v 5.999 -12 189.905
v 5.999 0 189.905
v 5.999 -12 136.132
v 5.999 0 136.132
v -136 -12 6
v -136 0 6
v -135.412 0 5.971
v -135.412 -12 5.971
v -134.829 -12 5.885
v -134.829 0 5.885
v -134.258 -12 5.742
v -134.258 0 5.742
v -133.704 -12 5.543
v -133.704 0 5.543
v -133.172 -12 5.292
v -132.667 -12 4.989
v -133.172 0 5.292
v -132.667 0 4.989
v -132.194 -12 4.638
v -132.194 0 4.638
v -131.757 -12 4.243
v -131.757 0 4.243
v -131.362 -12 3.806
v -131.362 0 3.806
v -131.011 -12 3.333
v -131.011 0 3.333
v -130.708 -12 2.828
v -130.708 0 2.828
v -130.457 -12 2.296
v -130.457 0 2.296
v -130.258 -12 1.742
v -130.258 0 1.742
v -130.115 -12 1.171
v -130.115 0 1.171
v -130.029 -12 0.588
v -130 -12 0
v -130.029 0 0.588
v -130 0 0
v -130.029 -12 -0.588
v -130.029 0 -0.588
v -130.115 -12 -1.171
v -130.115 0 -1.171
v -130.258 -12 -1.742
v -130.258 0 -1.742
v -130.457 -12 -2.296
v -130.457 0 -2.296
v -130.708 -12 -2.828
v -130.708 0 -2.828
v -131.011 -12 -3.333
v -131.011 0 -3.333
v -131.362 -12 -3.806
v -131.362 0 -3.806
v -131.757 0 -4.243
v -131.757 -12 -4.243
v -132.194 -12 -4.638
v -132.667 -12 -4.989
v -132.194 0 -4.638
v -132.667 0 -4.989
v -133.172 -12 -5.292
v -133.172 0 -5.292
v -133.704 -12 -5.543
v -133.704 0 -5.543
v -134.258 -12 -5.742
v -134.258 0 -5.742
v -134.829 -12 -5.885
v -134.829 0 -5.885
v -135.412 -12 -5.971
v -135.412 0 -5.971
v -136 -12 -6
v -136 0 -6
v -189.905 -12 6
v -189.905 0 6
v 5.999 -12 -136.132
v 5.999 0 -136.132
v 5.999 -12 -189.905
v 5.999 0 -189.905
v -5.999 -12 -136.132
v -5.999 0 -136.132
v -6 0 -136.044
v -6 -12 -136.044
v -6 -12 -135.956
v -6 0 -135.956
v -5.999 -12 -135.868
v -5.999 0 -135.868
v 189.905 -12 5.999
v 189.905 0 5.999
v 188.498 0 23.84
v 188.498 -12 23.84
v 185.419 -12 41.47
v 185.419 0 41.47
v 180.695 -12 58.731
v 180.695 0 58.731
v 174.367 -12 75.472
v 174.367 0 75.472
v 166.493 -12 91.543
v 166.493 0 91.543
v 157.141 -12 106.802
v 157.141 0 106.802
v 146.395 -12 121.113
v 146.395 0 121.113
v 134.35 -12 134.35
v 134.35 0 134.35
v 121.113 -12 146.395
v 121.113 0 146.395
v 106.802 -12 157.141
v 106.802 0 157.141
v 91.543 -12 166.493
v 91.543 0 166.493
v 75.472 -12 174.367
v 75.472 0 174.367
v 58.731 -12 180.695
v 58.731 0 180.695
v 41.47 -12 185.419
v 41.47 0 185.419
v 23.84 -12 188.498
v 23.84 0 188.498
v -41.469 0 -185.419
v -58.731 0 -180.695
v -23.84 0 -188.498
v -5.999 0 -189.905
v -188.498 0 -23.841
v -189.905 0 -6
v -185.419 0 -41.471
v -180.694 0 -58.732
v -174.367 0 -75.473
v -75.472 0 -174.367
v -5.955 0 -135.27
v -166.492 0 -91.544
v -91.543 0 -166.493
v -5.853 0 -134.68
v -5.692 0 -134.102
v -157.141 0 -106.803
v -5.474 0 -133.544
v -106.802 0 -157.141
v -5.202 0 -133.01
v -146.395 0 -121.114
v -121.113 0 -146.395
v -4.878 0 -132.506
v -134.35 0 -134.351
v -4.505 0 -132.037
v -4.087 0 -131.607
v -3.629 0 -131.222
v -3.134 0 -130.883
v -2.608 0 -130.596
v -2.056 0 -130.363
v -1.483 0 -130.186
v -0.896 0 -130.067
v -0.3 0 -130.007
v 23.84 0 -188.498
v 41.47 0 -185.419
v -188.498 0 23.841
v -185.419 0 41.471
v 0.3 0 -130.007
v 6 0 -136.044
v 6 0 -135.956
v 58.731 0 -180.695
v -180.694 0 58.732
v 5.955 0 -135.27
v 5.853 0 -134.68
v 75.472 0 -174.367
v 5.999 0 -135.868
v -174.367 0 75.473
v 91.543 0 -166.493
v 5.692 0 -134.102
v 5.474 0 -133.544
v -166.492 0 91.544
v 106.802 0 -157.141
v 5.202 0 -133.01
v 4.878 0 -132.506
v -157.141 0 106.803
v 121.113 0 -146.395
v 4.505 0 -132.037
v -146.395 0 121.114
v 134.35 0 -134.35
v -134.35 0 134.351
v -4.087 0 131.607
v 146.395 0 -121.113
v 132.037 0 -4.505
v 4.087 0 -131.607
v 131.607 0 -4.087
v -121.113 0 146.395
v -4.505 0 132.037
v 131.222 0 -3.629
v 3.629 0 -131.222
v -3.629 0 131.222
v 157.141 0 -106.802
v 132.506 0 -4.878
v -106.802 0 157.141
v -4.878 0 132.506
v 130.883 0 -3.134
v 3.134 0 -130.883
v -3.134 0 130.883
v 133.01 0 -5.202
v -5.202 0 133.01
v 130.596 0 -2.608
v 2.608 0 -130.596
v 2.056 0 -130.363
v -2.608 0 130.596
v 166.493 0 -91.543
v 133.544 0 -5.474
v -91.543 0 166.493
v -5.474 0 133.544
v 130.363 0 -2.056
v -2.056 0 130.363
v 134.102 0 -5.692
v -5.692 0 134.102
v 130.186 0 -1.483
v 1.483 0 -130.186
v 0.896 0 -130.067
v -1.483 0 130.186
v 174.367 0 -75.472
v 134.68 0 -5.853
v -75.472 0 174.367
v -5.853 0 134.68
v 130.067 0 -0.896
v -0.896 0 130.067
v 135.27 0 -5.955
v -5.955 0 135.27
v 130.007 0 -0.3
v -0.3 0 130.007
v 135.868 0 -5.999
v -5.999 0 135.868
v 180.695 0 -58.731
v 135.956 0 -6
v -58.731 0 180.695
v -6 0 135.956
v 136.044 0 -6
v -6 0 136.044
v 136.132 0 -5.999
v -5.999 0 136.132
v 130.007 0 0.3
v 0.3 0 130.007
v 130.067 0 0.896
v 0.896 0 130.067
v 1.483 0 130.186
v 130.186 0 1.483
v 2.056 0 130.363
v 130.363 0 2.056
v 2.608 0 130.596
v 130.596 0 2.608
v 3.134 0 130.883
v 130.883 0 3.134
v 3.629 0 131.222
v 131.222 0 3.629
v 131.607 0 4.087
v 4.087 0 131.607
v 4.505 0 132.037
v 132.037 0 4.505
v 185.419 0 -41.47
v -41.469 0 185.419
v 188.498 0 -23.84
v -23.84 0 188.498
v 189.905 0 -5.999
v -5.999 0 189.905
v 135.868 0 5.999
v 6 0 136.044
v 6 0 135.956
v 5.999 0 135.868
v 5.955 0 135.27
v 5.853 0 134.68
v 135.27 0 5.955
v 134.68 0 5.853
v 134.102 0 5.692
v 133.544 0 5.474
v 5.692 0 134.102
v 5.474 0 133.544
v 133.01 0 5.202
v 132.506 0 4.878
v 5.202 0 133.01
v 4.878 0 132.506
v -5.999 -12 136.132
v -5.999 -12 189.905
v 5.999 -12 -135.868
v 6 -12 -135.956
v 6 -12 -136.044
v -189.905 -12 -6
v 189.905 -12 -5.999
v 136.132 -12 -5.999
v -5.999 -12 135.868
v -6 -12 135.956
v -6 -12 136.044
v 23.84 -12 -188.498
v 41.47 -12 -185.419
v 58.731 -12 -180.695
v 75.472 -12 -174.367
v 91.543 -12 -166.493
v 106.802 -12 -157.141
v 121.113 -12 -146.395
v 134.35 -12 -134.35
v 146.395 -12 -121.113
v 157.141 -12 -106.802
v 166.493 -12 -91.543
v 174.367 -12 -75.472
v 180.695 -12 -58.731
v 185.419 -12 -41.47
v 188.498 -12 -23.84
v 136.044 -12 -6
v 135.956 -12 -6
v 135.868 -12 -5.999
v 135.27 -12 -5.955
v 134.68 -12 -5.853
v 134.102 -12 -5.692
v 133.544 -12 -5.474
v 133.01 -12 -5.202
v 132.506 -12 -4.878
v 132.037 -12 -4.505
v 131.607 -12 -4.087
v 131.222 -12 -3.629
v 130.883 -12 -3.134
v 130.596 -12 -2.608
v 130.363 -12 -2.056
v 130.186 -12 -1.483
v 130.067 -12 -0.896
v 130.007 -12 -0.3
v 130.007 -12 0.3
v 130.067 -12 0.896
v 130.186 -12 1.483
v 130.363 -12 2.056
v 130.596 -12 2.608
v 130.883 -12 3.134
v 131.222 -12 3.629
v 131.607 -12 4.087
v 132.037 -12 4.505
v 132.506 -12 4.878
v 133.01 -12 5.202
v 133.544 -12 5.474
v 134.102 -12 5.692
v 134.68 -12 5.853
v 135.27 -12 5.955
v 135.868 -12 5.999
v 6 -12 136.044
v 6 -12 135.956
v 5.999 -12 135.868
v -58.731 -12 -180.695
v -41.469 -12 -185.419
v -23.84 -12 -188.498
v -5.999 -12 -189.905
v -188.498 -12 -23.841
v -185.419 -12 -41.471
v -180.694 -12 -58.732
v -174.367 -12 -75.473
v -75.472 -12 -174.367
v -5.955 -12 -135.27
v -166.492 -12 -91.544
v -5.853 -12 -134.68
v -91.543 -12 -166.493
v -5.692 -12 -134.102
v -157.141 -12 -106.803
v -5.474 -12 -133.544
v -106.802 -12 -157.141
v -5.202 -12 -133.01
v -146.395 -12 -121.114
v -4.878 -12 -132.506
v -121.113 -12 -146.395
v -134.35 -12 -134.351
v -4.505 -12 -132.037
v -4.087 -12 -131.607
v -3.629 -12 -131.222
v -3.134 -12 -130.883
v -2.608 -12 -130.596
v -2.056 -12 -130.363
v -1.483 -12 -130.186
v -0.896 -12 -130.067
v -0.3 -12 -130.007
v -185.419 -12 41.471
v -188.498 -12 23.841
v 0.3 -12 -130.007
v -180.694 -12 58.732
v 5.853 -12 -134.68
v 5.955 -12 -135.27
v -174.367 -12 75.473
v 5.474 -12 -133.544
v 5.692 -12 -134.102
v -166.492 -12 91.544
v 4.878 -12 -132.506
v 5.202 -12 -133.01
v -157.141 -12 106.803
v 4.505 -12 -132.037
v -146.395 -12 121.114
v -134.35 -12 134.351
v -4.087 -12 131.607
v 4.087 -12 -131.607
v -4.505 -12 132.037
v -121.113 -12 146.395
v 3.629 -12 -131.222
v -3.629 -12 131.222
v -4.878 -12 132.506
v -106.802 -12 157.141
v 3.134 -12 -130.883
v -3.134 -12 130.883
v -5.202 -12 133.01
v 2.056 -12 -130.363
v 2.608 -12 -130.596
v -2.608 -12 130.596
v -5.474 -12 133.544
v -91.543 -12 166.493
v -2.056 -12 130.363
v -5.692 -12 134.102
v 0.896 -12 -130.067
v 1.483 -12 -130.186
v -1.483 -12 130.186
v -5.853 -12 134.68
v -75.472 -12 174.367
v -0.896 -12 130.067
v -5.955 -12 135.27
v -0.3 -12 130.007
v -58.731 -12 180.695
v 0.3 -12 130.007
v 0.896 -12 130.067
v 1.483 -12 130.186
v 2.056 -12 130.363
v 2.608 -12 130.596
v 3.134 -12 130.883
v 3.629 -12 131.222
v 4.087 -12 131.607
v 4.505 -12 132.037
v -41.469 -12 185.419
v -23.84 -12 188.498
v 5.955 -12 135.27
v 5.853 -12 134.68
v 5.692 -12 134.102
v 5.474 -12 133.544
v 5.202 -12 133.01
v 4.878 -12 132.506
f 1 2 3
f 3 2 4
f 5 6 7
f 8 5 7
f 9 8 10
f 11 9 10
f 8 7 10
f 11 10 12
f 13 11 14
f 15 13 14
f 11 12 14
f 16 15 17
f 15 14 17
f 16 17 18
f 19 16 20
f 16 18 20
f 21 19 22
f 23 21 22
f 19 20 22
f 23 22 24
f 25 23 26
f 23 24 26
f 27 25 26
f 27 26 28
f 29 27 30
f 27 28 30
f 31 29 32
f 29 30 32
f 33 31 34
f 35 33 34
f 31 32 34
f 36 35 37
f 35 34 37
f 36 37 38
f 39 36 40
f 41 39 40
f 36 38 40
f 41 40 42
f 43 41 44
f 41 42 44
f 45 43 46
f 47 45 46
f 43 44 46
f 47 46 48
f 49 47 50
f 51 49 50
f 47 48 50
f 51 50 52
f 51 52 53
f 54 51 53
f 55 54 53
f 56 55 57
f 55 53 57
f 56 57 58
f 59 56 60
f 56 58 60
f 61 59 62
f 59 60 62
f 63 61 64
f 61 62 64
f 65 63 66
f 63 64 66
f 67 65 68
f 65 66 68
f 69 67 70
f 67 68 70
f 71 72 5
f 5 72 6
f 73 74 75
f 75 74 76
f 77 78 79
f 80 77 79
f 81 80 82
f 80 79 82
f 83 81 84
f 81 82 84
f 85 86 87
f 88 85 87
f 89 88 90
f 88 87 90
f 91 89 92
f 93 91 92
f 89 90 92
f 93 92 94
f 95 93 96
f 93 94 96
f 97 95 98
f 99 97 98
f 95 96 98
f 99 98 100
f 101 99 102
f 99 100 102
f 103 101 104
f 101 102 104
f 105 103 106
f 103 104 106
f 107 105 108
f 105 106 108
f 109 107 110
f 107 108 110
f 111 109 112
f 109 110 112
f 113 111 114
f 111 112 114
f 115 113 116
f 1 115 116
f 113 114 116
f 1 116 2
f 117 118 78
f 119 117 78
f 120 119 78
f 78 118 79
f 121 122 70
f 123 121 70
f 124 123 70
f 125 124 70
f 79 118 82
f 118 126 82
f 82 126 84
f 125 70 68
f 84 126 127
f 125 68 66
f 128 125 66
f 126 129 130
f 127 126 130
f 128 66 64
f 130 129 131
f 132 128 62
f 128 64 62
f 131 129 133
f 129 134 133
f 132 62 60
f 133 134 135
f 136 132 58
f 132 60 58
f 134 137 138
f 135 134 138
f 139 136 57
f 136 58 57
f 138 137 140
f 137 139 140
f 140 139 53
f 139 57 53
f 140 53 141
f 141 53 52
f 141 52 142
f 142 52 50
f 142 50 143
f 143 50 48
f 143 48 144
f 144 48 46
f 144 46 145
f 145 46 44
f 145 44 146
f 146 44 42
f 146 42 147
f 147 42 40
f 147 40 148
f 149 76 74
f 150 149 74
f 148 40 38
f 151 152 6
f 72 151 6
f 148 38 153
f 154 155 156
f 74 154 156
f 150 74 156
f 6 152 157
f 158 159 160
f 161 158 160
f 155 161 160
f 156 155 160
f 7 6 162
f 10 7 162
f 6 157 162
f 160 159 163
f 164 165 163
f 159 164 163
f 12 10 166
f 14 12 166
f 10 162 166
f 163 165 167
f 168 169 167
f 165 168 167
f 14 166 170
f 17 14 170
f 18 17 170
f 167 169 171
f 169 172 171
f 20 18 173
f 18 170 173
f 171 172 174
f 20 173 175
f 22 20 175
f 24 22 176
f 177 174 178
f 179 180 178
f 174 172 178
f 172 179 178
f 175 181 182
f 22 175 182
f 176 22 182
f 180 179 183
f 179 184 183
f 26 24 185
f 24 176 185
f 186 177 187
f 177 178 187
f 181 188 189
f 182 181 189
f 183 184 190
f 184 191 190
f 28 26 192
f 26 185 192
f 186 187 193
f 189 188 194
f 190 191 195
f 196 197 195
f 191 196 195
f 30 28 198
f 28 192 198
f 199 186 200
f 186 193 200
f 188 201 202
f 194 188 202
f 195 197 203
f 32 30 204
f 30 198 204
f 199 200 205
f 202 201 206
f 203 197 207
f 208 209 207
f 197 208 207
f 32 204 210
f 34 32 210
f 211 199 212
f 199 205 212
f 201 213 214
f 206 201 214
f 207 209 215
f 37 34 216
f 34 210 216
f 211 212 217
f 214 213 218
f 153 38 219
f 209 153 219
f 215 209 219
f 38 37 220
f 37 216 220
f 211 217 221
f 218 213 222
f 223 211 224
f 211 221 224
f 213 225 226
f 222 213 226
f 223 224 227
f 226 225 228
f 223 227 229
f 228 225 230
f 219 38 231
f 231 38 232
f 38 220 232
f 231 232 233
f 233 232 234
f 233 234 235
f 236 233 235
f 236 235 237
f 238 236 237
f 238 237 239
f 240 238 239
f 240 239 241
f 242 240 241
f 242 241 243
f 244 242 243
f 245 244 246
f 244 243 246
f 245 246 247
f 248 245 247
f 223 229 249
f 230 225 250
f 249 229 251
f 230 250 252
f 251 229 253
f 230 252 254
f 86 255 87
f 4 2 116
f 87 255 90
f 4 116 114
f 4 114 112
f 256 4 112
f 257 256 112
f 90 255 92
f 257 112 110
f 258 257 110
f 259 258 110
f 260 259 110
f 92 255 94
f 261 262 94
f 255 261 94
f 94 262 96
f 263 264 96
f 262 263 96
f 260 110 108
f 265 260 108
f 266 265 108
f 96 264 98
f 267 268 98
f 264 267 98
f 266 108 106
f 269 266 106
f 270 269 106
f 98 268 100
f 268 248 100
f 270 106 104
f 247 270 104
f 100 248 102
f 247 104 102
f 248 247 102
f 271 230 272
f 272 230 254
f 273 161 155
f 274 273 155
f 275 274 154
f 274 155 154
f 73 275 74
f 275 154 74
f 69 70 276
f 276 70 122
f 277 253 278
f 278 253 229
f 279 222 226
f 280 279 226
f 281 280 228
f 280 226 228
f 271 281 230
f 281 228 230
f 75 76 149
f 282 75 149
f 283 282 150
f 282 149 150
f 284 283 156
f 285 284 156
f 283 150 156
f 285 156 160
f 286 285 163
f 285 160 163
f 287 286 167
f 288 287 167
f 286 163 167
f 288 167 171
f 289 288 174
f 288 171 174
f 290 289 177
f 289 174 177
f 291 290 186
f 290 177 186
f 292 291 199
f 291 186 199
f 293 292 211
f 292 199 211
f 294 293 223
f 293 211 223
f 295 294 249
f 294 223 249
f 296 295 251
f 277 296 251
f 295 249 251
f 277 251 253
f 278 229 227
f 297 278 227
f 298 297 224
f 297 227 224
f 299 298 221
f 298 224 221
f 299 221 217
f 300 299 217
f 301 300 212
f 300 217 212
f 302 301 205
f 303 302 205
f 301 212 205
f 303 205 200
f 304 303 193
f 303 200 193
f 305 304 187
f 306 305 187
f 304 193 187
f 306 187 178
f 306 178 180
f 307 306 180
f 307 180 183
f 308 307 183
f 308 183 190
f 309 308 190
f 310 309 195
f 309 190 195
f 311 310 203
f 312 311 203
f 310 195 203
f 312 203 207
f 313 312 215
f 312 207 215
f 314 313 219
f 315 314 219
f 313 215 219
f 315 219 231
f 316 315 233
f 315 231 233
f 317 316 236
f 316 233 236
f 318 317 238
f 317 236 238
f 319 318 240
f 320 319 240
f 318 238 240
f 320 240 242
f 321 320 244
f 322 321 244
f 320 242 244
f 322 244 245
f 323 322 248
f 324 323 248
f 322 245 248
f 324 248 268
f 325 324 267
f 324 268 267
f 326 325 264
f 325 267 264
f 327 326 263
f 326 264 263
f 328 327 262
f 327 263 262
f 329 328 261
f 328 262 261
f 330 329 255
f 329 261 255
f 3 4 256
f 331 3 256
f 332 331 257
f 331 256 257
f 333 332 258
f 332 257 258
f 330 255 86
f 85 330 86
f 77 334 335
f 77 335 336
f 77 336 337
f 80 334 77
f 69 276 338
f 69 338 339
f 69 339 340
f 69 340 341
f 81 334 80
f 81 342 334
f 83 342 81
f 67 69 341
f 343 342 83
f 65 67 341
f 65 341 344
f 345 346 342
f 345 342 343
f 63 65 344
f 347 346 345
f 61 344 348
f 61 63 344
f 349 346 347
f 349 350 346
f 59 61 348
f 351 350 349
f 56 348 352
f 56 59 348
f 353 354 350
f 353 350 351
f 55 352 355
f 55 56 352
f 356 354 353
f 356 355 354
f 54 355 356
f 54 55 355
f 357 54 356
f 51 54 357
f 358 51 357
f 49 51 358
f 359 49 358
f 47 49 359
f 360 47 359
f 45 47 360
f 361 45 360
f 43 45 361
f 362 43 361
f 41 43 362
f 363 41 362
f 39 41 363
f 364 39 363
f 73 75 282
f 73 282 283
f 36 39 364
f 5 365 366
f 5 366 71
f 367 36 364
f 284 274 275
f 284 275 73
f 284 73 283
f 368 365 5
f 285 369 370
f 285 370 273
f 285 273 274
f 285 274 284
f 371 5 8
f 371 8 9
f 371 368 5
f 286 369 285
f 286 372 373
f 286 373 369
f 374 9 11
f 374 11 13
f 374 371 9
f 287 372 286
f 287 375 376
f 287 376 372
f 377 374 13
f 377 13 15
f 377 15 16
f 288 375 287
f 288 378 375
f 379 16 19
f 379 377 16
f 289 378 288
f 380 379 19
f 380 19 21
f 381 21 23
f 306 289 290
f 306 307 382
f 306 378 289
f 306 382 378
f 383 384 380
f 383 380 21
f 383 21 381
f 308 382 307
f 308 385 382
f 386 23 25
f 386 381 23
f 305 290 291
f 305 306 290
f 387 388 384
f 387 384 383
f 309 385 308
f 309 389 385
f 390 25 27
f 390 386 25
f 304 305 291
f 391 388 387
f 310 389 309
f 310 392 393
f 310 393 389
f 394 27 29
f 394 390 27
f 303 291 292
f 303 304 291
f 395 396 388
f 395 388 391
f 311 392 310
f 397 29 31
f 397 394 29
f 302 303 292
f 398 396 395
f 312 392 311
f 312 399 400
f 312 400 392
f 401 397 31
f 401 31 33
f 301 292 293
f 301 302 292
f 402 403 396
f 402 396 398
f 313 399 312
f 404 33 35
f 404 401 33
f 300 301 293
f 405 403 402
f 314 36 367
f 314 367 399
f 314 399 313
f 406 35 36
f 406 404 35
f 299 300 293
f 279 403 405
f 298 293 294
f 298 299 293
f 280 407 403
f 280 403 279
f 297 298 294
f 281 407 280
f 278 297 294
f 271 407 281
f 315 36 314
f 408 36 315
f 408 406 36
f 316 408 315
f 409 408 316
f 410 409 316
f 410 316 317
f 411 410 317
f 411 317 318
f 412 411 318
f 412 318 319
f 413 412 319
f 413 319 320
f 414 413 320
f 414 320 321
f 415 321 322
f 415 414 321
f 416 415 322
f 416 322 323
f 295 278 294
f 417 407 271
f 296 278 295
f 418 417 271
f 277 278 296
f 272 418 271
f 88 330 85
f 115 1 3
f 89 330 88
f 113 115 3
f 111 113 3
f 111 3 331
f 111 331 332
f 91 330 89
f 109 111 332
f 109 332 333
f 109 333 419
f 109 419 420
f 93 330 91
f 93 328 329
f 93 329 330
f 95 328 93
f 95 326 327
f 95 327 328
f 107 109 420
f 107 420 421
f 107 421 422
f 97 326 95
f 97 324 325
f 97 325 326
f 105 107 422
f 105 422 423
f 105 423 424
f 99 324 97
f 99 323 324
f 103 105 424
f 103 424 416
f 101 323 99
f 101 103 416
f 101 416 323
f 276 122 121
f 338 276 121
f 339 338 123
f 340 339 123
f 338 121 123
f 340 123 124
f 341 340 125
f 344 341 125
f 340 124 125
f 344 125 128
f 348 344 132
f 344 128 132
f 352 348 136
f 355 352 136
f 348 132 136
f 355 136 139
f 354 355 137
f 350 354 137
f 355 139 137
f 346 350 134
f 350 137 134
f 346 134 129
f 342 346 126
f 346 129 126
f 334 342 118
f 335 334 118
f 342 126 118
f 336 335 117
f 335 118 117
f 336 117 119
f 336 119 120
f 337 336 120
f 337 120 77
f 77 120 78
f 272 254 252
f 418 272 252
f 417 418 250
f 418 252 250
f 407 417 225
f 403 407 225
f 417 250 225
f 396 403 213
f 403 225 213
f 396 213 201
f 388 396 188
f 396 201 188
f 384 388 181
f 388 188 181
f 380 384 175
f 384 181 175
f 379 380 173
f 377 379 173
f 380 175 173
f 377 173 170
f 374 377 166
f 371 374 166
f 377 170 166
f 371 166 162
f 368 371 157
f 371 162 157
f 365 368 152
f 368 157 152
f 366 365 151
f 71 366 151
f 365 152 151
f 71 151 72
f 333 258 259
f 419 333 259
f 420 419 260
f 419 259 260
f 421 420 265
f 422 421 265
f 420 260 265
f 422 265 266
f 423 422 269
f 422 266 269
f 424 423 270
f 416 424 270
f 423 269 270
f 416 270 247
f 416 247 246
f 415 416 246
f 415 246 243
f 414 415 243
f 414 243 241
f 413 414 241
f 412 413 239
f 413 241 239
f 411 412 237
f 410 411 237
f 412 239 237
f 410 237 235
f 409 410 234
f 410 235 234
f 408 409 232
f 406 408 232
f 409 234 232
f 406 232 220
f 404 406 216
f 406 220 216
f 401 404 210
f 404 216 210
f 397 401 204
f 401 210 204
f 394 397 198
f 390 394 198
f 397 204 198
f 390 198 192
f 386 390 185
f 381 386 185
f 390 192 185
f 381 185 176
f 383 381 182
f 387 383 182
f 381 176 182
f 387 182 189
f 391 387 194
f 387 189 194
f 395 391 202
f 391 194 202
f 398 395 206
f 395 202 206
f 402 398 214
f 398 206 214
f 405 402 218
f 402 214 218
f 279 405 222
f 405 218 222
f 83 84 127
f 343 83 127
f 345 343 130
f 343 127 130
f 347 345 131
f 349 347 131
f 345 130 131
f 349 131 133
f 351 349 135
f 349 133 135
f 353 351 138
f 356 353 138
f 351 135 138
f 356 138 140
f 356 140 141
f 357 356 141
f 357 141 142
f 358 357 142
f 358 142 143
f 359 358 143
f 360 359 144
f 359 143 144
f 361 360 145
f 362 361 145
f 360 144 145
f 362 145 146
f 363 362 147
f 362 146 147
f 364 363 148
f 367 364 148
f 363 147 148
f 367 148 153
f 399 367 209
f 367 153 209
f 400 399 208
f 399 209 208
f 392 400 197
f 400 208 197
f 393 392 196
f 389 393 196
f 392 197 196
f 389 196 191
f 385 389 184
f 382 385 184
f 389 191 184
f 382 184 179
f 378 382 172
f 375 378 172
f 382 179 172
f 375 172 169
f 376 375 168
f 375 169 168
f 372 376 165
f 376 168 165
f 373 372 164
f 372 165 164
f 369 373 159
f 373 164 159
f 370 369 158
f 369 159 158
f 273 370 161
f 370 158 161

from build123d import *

# Parameters (mm, degrees)
F1_DEPTH = 12


with BuildPart() as f1:
    # F0 (on Front) → F1 (new body)
    with BuildSketch(Plane.XZ):
        with BuildLine():
            Line((-5.99854, 136.132353), (-5.99854, 189.905286))
            ThreePointArc((-5.99854, 189.905286), (-134.349772, 134.350805), (-189.90524, 6))
            Line((-189.90524, 6), (-136, 6))
            ThreePointArc((-136, 6), (-130, 0), (-136, -6))
            Line((-136, -6), (-189.90524, -6))
            ThreePointArc((-189.90524, -6), (-134.349772, -134.350805), (-5.99854, -189.905286))
            Line((-5.99854, -189.905286), (-5.99854, -136.132353))
            ThreePointArc((-5.99854, -136.132353), (-6, -136), (-5.99854, -135.867647))
            ThreePointArc((-5.99854, -135.867647), (0, -130), (5.99854, -135.867647))
            ThreePointArc((5.99854, -135.867647), (6, -136), (5.99854, -136.132353))
            Line((5.99854, -136.132353), (5.99854, -189.905286))
            ThreePointArc((5.99854, -189.905286), (134.350288, -134.350288), (189.905286, -5.99854))
            Line((189.905286, -5.99854), (136.132353, -5.99854))
            ThreePointArc((136.132353, -5.99854), (136, -6), (135.867647, -5.99854))
            ThreePointArc((135.867647, -5.99854), (130, 0), (135.867647, 5.99854))
            Line((135.867647, 5.99854), (189.905286, 5.99854))
            ThreePointArc((189.905286, 5.99854), (134.350288, 134.350288), (5.99854, 189.905286))
            Line((5.99854, 189.905286), (5.99854, 136.132353))
            ThreePointArc((5.99854, 136.132353), (6, 136), (5.99854, 135.867647))
            ThreePointArc((5.99854, 135.867647), (0, 130), (-5.99854, 135.867647))
            ThreePointArc((-5.99854, 135.867647), (-6, 136), (-5.99854, 136.132353))
        make_face()
    extrude(amount=F1_DEPTH)


solid = f1.part
